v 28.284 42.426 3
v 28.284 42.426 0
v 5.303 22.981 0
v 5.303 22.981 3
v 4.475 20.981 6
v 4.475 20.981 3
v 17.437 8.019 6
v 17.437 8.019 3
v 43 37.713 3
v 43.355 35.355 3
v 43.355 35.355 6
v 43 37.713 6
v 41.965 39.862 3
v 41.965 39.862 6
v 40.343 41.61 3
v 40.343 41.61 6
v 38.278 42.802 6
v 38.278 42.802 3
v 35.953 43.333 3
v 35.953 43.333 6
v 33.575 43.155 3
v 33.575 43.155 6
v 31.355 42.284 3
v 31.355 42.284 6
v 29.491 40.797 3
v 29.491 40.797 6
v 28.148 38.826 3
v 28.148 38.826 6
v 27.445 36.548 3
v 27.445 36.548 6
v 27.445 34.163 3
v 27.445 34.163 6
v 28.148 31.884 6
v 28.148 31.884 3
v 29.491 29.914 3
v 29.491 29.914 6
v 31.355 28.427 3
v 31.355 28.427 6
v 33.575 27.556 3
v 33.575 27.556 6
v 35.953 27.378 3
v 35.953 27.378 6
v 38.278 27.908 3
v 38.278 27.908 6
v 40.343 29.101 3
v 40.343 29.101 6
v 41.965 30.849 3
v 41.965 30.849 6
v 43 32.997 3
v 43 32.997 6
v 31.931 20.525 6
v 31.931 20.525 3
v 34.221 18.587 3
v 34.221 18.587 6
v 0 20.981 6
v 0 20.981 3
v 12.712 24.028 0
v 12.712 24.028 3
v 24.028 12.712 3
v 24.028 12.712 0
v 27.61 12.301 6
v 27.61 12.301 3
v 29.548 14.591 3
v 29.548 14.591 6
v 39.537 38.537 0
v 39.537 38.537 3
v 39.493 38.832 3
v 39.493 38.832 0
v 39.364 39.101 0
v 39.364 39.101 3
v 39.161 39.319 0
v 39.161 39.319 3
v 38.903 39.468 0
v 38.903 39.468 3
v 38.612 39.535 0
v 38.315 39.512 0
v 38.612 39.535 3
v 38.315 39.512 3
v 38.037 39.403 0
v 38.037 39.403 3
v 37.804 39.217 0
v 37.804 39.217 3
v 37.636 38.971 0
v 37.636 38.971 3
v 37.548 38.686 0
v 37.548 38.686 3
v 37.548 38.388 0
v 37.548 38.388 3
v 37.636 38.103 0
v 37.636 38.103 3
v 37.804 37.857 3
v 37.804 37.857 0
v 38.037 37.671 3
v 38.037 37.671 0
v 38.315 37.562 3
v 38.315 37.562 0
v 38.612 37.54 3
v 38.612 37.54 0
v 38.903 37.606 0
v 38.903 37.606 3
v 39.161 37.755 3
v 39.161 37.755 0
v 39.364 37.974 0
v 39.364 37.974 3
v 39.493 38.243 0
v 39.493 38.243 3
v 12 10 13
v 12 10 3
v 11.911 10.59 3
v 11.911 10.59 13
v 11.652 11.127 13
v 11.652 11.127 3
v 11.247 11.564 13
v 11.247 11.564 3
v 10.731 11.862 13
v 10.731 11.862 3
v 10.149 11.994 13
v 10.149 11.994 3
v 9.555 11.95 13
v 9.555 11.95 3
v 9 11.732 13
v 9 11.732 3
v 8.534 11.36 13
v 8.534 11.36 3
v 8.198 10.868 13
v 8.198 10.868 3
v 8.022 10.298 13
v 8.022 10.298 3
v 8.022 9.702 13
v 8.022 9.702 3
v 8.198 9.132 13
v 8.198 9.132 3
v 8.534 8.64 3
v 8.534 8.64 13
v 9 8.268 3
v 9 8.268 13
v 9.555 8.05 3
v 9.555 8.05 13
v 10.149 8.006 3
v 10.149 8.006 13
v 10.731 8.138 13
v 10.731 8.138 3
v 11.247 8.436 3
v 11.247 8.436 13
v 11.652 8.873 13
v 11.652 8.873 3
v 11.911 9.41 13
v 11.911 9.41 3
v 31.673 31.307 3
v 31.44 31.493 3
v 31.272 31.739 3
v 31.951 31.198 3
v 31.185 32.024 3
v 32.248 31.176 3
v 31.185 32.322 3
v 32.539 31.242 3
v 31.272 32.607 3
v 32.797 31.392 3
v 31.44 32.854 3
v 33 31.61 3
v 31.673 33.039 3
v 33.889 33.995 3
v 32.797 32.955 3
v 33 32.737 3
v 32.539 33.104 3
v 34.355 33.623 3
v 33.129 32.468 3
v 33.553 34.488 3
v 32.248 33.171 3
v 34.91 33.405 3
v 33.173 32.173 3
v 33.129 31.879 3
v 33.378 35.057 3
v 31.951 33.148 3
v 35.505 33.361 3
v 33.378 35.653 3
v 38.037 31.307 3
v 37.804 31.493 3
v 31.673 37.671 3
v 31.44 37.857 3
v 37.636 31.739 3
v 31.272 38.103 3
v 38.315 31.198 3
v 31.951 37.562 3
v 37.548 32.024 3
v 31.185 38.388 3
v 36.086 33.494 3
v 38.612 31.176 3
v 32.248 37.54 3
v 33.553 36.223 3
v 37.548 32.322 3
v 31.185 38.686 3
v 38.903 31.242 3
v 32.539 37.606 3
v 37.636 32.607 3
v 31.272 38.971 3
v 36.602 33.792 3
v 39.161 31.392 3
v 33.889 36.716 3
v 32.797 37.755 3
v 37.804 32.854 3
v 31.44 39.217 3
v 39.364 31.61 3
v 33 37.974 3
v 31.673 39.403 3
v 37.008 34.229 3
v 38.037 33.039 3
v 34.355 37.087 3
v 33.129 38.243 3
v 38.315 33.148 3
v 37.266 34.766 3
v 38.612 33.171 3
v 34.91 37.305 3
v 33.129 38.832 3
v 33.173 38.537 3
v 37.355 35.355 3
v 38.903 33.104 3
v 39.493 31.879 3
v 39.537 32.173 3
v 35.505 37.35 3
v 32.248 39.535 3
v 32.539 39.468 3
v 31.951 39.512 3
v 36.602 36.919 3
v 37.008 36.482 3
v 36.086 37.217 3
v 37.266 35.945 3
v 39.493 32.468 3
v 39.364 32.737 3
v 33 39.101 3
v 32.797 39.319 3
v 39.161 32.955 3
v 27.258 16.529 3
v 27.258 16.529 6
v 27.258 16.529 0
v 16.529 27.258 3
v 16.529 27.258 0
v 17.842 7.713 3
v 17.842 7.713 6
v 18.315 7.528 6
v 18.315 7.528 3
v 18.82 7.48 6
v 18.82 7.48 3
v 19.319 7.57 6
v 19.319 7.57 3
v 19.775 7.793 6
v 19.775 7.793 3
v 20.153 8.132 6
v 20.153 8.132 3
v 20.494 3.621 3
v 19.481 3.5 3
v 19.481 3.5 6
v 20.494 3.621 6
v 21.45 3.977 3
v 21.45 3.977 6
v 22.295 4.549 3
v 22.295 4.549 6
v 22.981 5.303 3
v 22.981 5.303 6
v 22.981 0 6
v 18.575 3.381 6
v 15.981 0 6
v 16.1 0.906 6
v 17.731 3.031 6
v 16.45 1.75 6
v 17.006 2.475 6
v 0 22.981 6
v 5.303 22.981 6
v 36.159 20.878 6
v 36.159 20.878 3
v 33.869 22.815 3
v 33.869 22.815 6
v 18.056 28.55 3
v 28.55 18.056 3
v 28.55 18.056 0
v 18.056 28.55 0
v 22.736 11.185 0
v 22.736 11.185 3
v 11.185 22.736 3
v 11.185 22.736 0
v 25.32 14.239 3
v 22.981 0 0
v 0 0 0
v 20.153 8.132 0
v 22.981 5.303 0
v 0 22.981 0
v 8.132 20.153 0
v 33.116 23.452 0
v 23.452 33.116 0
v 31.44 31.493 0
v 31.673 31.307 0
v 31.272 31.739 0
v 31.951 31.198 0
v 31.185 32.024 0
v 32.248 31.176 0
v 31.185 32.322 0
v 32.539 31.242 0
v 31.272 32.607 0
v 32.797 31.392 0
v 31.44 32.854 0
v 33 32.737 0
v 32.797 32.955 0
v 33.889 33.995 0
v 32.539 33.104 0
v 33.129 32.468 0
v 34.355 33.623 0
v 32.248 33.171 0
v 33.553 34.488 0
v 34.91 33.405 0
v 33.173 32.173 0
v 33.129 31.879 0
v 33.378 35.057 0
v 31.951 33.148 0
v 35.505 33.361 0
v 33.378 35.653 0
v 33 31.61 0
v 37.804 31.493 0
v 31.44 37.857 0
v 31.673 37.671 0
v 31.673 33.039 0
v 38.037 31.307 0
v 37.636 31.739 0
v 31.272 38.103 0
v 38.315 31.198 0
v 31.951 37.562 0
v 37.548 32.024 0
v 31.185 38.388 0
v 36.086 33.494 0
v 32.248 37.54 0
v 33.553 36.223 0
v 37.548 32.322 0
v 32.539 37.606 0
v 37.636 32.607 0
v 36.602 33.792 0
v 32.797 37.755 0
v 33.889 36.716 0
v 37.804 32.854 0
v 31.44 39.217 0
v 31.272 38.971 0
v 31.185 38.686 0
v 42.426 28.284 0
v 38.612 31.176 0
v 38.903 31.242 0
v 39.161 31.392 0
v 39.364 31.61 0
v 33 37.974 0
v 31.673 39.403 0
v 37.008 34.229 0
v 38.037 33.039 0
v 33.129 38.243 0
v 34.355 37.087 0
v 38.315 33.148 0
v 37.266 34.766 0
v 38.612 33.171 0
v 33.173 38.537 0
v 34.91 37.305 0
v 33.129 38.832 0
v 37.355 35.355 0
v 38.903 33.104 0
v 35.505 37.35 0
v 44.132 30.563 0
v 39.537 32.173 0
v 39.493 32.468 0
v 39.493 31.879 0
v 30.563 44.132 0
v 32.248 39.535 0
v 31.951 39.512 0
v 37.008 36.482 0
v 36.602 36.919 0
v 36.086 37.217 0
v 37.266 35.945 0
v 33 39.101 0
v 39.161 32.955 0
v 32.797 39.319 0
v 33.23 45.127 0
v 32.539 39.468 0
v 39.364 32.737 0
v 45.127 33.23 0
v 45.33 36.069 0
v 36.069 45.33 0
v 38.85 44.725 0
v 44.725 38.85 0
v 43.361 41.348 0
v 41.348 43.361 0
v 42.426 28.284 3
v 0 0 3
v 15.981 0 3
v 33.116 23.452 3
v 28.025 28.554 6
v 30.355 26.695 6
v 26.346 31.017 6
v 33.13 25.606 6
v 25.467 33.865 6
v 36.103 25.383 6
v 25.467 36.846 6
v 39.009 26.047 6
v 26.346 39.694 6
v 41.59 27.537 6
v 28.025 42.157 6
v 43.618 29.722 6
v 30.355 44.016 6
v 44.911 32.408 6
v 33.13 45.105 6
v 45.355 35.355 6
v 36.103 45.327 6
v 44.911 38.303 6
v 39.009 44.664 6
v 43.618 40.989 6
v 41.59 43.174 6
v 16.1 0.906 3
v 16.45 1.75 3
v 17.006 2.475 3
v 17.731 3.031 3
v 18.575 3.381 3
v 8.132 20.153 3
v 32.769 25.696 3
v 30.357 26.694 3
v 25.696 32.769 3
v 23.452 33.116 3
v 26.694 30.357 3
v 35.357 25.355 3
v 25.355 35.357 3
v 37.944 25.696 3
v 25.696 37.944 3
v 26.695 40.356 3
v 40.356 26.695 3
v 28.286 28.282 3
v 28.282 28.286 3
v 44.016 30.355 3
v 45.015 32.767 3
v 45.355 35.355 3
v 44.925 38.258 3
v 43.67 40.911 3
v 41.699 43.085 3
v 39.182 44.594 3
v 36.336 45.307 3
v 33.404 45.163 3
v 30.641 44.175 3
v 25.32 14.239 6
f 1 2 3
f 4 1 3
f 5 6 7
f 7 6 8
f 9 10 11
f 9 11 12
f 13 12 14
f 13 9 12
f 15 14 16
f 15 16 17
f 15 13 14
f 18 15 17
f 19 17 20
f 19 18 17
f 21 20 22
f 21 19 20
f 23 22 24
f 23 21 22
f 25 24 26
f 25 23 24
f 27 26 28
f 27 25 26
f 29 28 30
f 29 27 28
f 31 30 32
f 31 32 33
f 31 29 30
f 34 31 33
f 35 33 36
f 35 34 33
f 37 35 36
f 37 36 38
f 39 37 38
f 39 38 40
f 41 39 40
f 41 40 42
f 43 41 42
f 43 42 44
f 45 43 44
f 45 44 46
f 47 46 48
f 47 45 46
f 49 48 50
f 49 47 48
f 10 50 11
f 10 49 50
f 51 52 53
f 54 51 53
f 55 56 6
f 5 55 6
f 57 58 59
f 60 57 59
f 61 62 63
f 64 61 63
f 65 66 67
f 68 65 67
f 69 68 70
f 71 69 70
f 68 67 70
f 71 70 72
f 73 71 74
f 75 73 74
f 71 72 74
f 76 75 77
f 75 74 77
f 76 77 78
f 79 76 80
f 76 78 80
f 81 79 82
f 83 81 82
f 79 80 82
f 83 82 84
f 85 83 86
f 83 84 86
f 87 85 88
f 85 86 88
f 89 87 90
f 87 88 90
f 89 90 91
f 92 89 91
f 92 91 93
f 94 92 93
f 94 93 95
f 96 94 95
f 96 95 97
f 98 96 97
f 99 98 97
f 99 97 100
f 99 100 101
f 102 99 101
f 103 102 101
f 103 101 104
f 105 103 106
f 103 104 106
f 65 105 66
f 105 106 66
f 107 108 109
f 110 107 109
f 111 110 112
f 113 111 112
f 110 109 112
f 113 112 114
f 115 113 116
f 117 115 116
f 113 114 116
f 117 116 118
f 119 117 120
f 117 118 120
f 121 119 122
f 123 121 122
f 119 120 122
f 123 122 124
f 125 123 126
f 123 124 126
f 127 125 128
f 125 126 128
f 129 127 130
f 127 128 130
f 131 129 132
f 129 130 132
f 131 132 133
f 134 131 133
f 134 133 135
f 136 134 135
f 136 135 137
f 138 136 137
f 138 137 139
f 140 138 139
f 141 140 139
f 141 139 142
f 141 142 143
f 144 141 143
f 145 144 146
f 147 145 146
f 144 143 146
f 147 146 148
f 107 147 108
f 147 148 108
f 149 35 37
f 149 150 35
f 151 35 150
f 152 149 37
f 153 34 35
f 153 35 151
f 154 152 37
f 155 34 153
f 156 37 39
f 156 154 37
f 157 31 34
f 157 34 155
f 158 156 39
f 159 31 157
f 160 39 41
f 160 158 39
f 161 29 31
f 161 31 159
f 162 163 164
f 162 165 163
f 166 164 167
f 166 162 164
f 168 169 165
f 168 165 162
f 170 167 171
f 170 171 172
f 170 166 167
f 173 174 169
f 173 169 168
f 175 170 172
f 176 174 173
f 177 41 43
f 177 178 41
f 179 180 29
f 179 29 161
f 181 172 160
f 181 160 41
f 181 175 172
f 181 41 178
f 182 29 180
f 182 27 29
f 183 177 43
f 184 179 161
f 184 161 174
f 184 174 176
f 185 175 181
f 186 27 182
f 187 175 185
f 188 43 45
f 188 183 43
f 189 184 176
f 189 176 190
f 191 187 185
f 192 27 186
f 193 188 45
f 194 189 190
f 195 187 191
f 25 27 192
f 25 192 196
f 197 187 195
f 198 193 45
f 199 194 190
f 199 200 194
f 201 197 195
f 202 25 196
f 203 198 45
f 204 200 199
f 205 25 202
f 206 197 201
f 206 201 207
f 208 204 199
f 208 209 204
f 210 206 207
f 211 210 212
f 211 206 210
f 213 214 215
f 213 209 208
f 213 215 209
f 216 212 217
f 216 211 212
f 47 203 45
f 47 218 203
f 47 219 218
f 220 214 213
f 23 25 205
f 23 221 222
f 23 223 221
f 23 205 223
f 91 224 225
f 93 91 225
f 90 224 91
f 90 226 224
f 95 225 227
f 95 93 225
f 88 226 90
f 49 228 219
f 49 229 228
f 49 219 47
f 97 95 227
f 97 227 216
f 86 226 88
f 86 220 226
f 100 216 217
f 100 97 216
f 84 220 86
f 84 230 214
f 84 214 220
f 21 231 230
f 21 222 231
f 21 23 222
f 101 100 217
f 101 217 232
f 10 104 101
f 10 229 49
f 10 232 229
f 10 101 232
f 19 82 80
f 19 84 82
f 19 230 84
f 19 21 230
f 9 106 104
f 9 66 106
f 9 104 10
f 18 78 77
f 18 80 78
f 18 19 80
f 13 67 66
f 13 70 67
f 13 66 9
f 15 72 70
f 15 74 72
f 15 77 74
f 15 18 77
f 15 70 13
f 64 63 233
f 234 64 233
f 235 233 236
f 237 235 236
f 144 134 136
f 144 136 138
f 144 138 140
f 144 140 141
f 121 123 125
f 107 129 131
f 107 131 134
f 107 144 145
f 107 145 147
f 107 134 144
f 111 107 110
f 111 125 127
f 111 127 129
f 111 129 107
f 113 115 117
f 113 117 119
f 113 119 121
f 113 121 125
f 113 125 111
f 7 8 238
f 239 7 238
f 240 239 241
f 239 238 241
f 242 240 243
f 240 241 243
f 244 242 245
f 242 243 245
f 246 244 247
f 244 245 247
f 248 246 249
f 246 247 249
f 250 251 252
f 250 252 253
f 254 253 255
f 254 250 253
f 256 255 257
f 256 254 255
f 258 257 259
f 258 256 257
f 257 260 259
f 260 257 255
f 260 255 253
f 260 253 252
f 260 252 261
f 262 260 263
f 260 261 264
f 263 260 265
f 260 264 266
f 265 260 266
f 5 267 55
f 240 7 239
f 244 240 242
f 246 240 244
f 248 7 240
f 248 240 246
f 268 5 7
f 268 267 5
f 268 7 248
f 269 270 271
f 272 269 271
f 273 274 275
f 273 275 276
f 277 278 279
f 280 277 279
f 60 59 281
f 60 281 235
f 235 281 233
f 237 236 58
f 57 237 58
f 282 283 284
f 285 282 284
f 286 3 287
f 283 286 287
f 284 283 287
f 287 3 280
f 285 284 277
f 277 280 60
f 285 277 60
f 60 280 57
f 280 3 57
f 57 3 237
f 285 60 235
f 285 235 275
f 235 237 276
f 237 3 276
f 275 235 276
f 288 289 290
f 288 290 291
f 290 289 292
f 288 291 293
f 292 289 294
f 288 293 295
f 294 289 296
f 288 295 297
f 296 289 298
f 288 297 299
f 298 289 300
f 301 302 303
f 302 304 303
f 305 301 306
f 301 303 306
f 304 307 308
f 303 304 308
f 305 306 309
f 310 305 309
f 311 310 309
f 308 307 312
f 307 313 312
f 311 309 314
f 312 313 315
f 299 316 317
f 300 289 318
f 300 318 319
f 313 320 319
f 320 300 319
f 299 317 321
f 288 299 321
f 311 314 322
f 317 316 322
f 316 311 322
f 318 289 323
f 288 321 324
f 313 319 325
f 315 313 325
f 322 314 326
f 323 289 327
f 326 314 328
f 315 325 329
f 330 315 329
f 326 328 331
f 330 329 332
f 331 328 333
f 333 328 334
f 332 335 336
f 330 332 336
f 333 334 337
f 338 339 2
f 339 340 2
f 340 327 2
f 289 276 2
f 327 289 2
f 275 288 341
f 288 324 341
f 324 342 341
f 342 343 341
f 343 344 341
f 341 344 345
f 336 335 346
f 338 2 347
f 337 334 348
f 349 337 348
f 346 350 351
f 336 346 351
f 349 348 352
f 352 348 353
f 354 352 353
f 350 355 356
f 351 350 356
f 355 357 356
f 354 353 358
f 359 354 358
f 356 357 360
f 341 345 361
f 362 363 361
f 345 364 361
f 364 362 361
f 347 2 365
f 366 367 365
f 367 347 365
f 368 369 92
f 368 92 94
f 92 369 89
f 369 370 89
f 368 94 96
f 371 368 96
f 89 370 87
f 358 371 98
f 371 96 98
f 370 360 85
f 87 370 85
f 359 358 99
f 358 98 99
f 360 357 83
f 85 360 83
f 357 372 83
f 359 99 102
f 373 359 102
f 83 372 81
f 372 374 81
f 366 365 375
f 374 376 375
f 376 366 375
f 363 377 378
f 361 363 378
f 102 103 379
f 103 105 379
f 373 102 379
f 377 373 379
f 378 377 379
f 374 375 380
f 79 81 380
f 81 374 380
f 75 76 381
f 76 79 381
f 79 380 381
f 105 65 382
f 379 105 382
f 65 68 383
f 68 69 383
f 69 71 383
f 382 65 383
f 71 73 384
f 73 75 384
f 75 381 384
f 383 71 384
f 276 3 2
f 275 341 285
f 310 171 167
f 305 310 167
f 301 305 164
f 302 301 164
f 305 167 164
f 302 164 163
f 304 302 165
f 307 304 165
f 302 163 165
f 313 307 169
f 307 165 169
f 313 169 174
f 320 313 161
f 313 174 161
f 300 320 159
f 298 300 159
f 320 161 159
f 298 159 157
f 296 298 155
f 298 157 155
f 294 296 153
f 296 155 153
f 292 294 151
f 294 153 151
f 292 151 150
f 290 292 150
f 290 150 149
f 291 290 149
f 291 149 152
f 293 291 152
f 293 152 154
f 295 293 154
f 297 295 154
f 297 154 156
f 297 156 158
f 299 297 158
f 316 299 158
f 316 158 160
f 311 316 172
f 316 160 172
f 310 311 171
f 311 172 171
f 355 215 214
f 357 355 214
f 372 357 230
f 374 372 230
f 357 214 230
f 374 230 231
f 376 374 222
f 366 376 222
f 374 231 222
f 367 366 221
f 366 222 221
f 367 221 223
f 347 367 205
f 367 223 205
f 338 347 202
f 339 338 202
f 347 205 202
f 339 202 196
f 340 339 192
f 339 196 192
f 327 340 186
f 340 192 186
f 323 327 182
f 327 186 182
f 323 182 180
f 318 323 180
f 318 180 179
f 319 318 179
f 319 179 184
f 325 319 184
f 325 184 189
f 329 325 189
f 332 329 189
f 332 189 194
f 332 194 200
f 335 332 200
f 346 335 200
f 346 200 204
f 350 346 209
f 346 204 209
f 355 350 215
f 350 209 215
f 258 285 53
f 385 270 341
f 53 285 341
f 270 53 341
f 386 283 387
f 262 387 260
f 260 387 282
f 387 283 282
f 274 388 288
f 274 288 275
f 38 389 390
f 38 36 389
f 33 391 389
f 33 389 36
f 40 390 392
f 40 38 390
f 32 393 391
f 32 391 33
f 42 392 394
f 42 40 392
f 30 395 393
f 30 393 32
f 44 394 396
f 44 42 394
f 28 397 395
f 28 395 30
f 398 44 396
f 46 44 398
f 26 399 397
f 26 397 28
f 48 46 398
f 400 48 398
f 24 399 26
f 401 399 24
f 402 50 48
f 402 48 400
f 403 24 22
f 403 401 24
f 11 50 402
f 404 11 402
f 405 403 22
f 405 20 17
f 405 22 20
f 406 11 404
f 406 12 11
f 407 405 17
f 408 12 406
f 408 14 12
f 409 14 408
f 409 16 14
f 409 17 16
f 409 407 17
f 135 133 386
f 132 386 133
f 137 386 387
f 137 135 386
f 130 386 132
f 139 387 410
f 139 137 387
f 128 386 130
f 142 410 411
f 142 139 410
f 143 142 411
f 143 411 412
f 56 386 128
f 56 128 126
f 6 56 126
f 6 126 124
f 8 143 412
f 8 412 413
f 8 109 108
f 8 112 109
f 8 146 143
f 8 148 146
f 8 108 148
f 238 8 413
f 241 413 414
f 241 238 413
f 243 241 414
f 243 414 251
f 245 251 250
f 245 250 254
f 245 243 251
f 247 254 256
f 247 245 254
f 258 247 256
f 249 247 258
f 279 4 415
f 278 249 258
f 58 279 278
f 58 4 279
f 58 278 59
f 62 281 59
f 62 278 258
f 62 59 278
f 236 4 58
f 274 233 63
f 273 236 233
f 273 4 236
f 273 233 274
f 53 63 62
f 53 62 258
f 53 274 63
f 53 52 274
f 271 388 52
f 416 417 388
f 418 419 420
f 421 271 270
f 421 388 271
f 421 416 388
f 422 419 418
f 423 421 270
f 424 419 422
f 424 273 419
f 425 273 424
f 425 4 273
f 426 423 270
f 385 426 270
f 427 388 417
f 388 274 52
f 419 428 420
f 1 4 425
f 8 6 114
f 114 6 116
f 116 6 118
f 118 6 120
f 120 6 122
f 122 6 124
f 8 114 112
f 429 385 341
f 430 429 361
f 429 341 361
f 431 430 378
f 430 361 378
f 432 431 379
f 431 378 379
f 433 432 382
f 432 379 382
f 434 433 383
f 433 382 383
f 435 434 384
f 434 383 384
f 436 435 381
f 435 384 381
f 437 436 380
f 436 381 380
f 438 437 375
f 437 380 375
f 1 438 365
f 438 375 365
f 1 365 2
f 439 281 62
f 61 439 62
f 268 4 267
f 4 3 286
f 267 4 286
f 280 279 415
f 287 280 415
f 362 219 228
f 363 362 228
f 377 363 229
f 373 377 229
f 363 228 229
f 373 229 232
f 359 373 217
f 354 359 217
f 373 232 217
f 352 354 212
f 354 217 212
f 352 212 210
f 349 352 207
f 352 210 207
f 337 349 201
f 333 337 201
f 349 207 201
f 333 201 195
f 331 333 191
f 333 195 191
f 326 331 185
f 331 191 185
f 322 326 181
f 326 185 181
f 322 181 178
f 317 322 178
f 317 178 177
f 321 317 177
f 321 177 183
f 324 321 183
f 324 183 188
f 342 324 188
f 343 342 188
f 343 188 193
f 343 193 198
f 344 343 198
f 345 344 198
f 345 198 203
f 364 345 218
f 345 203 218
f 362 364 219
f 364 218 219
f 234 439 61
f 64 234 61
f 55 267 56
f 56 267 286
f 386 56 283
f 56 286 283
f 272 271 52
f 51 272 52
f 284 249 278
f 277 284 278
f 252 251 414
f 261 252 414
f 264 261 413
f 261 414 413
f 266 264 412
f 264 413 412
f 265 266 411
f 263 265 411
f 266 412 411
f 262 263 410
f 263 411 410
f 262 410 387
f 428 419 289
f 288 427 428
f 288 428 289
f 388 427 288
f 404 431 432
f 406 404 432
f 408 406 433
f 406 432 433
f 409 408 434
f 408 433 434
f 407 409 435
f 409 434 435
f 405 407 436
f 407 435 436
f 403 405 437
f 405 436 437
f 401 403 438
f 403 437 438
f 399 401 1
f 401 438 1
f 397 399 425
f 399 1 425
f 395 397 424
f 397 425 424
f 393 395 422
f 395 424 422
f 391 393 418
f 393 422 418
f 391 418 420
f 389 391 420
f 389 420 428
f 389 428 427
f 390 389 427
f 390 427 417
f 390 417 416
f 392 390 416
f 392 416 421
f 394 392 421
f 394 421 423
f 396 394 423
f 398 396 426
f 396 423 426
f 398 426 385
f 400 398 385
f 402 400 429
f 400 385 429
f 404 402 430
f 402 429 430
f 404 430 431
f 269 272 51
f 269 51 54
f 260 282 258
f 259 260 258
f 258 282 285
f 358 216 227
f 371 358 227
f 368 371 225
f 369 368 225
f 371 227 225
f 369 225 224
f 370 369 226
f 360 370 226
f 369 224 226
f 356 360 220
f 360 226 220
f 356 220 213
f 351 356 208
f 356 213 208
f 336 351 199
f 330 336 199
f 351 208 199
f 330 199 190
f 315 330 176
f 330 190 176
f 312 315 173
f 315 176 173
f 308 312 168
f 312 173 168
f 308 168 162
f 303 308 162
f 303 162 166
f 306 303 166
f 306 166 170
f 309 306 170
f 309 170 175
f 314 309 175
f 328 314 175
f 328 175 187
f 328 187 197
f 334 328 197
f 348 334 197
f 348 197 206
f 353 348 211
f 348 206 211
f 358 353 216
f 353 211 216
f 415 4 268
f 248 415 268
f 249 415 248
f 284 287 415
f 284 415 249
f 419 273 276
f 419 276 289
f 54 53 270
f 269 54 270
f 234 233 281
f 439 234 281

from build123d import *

# Parameters (mm, degrees)
PAD_DEPTH       = 3
SKETCH001_R     = 2
SKETCH001_R_2   = 1
POCKET_DEPTH    = 3
POCKET001_DEPTH = 3
SKETCH003_R     = 10
SKETCH003_R_2   = 8
PAD001_DEPTH    = 3
PAD002_DEPTH    = 3
SKETCH005_R     = 2
PAD003_DEPTH    = 10
PAD004_DEPTH    = 3


with BuildPart() as part:
    # Sketch → Pad (new body)
    with BuildSketch(Plane.XY):
        with BuildLine():
            ThreePointArc((42.426407, 28.284271), (42.426407, 42.426407), (28.284271, 42.426407))
            Line((28.284271, 42.426407), (5.303301, 22.98097))
            Line((5.303301, 22.98097), (0, 22.98097))
            Line((0, 22.98097), (0, 0))
            Line((0, 0), (22.98097, 0))
            Line((22.98097, 0), (22.98097, 5.303301))
            Line((22.98097, 5.303301), (42.426407, 28.284271))
        make_face()
    extrude(amount=PAD_DEPTH)

    # Sketch001 → Pocket (cut)
    with BuildSketch(Plane.XY.offset(3)):
        with Locations((35.355339, 35.355339)):
            Circle(SKETCH001_R)
        with Locations((38.53732, 38.53732)):
            Circle(SKETCH001_R_2)
        with Locations((32.173359, 38.53732)):
            Circle(SKETCH001_R_2)
        with Locations((32.173359, 32.173359)):
            Circle(SKETCH001_R_2)
        with Locations((38.53732, 32.173359)):
            Circle(SKETCH001_R_2)
    extrude(amount=-POCKET_DEPTH, mode=Mode.SUBTRACT)

    # Sketch002 → Pocket001 (cut)
    with BuildSketch(Plane.XY.offset(3)):
        Polygon((23.452375, 33.116168), (33.116168, 23.452375), (28.549792, 18.05575), (18.05575, 28.549792), align=None)
        Polygon((8.131728, 20.152543), (20.152543, 8.131728), (22.736312, 11.185273), (11.185273, 22.736312), align=None)
        Polygon((12.712046, 24.028197), (24.028197, 12.712046), (27.257908, 16.528977), (16.528977, 27.257908), align=None)
    extrude(amount=-POCKET001_DEPTH, mode=Mode.SUBTRACT)

    # Sketch003 → Pad001 (new body)
    with BuildSketch(Plane.XY.offset(3)):
        with Locations((35.355339, 35.355339)):
            Circle(SKETCH003_R)
        with Locations((35.355339, 35.355339)):
            Circle(SKETCH003_R_2, mode=Mode.SUBTRACT)
    extrude(amount=PAD001_DEPTH)

    # Sketch004 → Pad002 (new body)
    with BuildSketch(Plane.XY.offset(3)):
        Polygon((36.159165, 20.877531), (33.869006, 22.815358), (31.931179, 20.525199), (34.221338, 18.587372), align=None)
        Polygon((25.320081, 14.238818), (27.61024, 12.300992), (29.548067, 14.59115), (27.257908, 16.528977), align=None)
    extrude(amount=PAD002_DEPTH)

    # Sketch005 → Pad003 (new body)
    with BuildSketch(Plane.XY.offset(3)):
        with Locations((10, 10)):
            Circle(SKETCH005_R)
    extrude(amount=PAD003_DEPTH)

    # Sketch006 → Pad004 (new body)
    with BuildSketch(Plane.XY.offset(3)):
        with BuildLine():
            Line((5.303301, 22.98097), (0, 22.98097))
            Line((0, 22.98097), (0, 20.98097))
            Line((0, 20.98097), (4.474874, 20.98097))
            Line((4.474874, 20.98097), (17.437065, 8.018779))
            ThreePointArc((17.437065, 8.018779), (18.819584, 7.479505), (20.152543, 8.131728))
            Line((5.303301, 22.98097), (20.152543, 8.131728))
        make_face()
        with BuildLine():
            Line((22.98097, 5.303301), (22.98097, 0))
            Line((22.98097, 0), (20.98097, 0))
            Line((20.98097, 0), (17.98097, 0))
            Line((17.98097, 0), (15.98097, 0))
            ThreePointArc((19.48097, 3.5), (17.006097, 2.474874), (15.98097, 0))
            ThreePointArc((19.48097, 3.5), (21.449594, 3.977328), (22.98097, 5.303301))
        make_face()
    extrude(amount=PAD004_DEPTH)


solid = part.part
